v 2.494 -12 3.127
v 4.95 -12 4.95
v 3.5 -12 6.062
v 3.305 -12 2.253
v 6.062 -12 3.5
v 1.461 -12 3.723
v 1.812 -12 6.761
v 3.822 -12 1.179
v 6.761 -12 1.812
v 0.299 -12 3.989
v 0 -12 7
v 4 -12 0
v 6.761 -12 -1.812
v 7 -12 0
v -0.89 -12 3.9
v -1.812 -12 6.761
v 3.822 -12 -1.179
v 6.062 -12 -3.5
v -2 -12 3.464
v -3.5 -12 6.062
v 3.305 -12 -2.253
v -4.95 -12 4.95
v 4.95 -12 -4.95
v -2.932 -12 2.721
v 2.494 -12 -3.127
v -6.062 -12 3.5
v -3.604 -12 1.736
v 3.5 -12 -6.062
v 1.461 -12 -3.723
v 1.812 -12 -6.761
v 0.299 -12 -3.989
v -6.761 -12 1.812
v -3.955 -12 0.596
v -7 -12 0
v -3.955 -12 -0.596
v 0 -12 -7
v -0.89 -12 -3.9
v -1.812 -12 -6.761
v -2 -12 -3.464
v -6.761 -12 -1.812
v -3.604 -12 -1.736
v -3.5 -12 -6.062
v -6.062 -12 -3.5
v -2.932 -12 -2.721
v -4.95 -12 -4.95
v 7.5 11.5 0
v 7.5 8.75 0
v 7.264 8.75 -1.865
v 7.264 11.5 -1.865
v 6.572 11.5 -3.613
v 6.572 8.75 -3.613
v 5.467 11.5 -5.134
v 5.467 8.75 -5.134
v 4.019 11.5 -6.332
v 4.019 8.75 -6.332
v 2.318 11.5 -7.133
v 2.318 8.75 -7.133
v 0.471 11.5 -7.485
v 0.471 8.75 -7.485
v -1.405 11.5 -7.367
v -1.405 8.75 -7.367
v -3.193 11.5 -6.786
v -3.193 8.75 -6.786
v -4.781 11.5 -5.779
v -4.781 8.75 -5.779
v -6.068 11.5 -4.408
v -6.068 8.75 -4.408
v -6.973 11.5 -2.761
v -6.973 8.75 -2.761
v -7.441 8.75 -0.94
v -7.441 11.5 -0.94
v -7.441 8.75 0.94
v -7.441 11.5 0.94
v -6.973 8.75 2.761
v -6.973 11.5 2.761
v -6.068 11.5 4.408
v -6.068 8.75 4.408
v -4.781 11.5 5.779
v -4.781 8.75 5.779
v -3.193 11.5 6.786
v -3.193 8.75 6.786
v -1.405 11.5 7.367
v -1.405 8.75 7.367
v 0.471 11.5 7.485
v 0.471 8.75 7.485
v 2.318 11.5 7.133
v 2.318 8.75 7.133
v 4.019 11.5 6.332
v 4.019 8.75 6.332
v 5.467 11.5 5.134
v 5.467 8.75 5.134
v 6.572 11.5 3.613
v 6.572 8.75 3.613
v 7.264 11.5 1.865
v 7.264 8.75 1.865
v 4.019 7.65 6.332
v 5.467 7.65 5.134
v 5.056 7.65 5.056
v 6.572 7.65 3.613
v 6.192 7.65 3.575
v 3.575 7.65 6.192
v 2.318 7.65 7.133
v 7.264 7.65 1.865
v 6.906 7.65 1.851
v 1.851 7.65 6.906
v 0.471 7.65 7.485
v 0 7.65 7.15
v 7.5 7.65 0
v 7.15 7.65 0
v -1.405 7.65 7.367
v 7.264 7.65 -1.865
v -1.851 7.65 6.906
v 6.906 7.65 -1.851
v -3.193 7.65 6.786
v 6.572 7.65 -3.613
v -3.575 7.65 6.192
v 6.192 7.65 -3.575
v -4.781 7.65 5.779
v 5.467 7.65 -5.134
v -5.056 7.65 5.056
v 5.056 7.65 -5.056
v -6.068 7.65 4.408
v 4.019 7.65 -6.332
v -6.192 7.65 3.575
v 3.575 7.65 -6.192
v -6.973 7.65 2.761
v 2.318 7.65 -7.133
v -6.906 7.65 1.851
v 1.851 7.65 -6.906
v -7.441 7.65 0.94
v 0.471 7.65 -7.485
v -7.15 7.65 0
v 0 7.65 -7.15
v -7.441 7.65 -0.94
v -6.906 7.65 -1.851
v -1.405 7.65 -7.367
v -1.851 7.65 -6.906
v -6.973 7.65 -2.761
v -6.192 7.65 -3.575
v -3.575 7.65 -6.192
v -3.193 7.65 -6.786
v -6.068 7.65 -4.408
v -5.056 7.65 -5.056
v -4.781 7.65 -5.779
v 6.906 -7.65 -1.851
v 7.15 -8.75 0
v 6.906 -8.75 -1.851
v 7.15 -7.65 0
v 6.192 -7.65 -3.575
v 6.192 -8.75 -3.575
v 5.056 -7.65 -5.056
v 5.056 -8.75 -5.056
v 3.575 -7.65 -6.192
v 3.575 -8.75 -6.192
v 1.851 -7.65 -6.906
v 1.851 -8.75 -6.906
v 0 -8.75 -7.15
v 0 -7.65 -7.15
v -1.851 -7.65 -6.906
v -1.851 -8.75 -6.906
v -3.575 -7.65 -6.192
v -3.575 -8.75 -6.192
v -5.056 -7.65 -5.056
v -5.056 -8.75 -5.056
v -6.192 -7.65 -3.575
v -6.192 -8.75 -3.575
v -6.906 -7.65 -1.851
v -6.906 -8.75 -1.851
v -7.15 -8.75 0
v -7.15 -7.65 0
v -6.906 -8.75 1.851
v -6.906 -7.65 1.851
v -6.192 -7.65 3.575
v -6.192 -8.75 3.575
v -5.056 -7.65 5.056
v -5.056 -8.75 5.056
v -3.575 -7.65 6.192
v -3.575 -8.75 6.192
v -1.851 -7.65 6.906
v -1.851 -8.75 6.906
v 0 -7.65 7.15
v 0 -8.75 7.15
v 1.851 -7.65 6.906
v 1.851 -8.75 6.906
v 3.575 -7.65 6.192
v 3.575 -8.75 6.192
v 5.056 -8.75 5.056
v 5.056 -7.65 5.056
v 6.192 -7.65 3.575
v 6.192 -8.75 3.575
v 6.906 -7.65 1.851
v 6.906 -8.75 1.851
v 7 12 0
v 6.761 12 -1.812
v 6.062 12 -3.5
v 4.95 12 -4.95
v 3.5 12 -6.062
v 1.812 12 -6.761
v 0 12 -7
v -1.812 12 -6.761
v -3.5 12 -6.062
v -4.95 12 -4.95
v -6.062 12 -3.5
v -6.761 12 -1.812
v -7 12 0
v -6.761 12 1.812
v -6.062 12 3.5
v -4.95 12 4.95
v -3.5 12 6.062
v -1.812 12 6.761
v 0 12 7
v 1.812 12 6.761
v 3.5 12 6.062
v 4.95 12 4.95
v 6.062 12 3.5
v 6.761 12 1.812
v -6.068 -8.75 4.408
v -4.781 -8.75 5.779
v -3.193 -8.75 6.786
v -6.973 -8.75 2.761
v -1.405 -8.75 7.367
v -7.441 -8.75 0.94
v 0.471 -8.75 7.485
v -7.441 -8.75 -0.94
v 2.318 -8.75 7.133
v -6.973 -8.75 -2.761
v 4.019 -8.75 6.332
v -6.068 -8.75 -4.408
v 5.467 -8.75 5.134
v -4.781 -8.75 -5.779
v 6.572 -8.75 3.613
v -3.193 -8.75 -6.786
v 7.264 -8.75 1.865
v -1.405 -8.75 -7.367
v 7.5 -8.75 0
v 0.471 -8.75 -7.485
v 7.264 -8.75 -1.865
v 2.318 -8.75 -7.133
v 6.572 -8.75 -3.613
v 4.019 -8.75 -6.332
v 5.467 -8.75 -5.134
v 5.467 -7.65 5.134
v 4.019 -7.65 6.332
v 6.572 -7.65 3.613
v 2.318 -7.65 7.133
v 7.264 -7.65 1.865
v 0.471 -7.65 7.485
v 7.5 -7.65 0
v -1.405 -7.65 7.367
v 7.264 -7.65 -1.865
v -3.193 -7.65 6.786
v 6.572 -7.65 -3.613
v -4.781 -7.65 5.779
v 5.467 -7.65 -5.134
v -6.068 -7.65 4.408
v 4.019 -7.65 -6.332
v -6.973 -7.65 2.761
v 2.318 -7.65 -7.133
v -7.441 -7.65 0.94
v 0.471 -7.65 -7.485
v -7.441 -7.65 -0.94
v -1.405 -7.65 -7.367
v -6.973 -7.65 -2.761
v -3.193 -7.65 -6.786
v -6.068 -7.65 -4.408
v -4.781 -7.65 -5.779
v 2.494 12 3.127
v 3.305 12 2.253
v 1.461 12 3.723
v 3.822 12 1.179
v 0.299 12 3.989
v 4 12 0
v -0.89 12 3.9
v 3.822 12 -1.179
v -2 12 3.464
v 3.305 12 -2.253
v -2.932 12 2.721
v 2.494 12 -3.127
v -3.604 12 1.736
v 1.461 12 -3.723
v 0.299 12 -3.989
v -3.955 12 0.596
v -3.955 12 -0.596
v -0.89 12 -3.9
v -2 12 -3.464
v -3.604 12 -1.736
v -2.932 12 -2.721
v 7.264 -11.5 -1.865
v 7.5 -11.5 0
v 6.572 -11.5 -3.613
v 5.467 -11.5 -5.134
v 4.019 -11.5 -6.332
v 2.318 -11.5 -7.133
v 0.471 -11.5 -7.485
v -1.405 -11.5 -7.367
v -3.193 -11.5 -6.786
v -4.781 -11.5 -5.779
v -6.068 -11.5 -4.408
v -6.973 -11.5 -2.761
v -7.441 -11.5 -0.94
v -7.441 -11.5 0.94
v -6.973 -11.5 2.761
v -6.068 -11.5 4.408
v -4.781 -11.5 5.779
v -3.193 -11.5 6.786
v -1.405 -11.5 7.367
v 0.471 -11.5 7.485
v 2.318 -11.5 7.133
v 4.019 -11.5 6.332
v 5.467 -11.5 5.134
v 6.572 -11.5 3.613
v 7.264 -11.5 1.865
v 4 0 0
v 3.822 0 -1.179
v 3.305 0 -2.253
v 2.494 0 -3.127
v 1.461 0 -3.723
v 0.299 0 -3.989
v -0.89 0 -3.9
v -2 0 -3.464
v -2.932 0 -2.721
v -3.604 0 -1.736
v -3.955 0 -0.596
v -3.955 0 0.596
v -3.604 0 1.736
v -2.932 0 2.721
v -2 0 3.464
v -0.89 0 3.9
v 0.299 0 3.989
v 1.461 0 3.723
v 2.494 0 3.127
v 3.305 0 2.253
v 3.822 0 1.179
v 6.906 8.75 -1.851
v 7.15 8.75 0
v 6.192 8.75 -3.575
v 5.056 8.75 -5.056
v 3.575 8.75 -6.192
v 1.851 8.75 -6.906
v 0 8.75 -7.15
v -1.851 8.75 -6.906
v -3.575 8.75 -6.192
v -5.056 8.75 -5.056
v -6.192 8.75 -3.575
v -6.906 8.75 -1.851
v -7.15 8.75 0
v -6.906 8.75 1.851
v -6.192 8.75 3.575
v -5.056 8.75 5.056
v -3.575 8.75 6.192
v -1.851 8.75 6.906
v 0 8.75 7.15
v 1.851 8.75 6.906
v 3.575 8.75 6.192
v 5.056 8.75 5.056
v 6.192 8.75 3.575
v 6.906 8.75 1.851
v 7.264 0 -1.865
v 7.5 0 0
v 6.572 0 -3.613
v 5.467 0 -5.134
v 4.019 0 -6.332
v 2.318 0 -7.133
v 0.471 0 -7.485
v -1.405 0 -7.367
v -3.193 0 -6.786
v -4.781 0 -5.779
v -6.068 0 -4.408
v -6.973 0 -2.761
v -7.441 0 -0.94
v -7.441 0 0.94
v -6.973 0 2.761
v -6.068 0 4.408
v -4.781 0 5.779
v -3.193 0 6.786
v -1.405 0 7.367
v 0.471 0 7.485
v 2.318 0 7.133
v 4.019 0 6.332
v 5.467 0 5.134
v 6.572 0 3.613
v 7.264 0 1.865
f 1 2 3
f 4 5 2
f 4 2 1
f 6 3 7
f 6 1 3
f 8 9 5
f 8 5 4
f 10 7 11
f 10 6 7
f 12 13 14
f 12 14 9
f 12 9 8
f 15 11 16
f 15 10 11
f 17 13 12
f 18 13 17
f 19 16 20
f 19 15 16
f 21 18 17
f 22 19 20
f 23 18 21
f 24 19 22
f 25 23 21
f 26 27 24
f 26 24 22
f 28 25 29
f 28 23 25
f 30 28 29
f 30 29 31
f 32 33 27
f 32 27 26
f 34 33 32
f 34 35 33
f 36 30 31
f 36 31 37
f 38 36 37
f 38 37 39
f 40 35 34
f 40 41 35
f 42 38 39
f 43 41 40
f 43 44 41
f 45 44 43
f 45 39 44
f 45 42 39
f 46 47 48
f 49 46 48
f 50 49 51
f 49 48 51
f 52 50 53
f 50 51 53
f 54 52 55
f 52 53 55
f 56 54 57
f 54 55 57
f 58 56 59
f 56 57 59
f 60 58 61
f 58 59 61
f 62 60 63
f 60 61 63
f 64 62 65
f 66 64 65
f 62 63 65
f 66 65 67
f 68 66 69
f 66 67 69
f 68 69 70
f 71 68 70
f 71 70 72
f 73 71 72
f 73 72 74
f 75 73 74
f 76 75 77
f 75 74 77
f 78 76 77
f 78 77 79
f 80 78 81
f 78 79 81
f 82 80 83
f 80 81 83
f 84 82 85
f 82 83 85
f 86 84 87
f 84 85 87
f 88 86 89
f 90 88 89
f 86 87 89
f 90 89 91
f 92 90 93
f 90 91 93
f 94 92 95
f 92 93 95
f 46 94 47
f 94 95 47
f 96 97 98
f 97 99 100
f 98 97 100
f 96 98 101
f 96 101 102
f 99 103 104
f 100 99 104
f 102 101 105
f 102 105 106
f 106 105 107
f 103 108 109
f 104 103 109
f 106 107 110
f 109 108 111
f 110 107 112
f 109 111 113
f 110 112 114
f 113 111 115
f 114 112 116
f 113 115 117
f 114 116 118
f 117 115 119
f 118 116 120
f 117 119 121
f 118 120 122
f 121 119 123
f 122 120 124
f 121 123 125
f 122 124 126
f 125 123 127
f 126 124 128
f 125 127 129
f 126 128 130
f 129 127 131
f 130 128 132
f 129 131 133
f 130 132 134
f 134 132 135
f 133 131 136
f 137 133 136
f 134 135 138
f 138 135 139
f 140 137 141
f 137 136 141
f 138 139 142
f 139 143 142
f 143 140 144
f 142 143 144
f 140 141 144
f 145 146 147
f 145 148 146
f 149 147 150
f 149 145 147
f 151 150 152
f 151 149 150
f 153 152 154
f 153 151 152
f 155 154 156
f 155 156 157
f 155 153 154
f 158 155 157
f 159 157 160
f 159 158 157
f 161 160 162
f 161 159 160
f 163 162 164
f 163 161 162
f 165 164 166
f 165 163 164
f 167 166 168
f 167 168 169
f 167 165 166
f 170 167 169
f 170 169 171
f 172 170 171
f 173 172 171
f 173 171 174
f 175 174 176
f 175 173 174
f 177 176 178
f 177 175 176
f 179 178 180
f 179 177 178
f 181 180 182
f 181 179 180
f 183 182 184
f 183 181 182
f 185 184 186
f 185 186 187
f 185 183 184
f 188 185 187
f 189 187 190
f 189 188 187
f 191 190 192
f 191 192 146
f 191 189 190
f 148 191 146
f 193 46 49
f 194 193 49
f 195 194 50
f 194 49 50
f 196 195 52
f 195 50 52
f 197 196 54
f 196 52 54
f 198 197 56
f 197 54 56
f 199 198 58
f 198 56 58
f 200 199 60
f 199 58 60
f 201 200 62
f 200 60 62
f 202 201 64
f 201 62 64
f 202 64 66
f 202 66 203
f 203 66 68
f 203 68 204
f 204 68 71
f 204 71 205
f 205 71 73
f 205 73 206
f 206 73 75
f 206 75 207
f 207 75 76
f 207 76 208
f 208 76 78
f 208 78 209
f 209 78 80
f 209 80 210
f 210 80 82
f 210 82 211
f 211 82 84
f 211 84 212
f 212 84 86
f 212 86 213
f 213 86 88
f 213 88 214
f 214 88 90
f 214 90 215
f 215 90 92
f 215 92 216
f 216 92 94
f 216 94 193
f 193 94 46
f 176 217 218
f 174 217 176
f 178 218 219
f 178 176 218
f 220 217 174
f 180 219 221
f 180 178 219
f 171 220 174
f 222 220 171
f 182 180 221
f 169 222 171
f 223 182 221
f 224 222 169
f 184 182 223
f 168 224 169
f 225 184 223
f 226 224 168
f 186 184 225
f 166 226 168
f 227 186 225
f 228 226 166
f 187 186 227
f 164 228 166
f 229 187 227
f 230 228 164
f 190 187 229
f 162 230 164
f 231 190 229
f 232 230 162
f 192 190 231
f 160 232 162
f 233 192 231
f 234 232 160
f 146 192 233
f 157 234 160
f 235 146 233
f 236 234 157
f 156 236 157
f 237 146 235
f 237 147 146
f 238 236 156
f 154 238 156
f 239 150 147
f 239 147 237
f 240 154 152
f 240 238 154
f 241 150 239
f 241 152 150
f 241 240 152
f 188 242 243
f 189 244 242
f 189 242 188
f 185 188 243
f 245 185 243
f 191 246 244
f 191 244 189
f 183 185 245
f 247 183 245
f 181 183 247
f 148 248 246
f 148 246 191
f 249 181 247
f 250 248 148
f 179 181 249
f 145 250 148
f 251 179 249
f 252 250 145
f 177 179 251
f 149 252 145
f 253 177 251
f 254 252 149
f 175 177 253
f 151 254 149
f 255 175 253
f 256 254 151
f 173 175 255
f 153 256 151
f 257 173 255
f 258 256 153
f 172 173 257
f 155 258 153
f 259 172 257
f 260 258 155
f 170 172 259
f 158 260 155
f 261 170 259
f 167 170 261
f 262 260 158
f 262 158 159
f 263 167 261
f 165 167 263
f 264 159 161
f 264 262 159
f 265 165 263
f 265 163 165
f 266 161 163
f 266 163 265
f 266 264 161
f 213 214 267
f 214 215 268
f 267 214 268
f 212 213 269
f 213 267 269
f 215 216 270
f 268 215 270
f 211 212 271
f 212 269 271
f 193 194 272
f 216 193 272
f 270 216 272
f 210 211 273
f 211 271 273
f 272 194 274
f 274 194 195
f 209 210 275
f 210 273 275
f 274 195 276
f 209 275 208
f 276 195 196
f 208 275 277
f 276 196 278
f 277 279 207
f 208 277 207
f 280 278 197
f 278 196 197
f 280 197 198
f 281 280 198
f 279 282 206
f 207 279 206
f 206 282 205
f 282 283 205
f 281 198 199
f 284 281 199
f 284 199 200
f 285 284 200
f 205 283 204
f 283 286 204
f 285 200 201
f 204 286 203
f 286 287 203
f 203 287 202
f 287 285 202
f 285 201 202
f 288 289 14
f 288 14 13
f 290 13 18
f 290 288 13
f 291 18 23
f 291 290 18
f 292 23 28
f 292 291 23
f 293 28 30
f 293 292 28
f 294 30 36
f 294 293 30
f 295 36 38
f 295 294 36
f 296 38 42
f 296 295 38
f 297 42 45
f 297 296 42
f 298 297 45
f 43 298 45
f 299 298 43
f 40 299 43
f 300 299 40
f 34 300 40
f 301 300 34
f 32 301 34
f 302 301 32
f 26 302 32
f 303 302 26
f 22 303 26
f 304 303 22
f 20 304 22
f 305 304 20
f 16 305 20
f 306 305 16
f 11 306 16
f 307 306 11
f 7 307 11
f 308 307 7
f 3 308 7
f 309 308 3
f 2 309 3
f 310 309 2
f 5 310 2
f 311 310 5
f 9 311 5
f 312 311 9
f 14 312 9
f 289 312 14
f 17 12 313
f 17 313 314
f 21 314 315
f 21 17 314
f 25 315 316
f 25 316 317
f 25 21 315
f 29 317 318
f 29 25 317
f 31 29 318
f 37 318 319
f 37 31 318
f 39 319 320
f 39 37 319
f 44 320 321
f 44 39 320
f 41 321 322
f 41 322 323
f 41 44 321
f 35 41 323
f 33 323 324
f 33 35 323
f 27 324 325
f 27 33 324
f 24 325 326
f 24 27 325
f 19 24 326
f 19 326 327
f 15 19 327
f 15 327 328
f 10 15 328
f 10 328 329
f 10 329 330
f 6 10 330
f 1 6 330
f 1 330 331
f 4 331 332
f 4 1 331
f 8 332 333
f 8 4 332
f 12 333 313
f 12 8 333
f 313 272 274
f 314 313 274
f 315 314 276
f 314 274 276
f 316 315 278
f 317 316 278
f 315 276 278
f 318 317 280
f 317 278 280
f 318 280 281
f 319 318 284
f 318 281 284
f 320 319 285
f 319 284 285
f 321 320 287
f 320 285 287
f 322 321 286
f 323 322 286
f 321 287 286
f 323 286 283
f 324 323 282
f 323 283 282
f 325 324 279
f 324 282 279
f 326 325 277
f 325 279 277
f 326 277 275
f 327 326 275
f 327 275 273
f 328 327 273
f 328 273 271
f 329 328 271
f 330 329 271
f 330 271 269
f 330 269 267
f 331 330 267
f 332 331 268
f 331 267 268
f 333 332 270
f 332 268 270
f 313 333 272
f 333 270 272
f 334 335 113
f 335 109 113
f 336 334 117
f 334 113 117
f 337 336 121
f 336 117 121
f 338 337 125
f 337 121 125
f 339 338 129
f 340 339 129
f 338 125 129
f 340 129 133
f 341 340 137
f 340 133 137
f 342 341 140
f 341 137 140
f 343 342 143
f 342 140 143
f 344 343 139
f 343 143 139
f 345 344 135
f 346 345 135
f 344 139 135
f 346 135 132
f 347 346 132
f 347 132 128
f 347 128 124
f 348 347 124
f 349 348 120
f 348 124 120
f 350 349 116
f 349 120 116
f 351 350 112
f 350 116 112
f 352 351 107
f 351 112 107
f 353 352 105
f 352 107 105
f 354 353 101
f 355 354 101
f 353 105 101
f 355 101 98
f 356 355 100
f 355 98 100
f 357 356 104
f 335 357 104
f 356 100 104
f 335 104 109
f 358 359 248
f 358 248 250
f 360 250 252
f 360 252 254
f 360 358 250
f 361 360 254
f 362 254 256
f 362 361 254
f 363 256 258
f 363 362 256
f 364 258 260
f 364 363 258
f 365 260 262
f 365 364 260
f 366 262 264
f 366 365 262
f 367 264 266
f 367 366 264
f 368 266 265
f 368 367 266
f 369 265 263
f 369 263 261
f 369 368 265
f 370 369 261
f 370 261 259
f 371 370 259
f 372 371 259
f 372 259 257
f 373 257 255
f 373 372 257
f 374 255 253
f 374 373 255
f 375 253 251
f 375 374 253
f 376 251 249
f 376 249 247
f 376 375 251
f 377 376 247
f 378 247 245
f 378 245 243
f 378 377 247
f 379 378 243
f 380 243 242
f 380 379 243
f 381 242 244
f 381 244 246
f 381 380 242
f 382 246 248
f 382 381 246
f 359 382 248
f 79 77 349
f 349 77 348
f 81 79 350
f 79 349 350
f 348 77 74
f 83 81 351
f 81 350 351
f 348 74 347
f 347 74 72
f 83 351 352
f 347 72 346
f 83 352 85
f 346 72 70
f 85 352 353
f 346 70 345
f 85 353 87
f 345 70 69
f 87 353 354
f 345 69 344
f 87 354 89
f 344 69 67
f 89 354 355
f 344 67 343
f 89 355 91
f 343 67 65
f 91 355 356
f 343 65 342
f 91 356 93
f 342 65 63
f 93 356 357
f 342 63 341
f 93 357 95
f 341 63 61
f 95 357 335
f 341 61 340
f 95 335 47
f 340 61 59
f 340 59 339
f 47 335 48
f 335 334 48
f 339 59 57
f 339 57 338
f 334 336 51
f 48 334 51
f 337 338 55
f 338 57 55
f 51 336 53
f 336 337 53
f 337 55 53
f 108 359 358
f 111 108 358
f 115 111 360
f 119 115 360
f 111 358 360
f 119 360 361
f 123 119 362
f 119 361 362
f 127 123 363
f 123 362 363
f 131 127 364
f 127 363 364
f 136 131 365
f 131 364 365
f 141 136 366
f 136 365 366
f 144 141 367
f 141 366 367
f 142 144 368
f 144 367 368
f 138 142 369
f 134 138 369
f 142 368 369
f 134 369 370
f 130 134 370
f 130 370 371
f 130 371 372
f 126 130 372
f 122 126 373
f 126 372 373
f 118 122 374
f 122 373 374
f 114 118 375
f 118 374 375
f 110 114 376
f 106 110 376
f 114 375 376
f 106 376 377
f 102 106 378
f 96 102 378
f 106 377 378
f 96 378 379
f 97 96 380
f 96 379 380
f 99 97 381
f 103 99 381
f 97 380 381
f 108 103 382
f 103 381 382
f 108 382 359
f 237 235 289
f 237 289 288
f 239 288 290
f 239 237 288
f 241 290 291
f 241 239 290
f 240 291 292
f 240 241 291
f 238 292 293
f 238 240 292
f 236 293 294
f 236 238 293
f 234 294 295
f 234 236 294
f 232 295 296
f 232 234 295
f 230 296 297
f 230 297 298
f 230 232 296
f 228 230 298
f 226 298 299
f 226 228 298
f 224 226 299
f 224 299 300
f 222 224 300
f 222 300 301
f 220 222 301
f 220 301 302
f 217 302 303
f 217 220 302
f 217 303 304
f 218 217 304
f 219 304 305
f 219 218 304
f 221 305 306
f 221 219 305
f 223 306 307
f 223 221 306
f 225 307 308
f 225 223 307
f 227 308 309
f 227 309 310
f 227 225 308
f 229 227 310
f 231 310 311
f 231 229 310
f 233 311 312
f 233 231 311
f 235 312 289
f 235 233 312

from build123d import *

# Parameters (mm, degrees)
CHAMFER1_SIZE = 0.5


with BuildPart() as part:
    # Sketch1 → Revolve1 (revolve)
    with BuildSketch(Plane.XY):
        Polygon((4, 0), (4, 12), (7.5, 12), (7.5, 8.75), (7.15, 8.75), (7.15, 7.65), (7.5, 7.65), (7.5, 0), align=None)
    revolve(axis=Axis((0, 0, 0), (0, 1, 0)))

    # Chamfer1
    chamfer1_edges = [part.edges().sort_by_distance(p)[0] for p in [
        (-7.5, 12, 0),
    ]]
    chamfer(chamfer1_edges, length=CHAMFER1_SIZE)

    # Mirror1: part across plane


with BuildPart() as part_1:
    add(part.part)
    add(part.part.mirror(Plane(origin=(7.5, 0, 0), x_dir=(0, 0, 1), z_dir=(0, -1, 0))))


solid = part_1.part
